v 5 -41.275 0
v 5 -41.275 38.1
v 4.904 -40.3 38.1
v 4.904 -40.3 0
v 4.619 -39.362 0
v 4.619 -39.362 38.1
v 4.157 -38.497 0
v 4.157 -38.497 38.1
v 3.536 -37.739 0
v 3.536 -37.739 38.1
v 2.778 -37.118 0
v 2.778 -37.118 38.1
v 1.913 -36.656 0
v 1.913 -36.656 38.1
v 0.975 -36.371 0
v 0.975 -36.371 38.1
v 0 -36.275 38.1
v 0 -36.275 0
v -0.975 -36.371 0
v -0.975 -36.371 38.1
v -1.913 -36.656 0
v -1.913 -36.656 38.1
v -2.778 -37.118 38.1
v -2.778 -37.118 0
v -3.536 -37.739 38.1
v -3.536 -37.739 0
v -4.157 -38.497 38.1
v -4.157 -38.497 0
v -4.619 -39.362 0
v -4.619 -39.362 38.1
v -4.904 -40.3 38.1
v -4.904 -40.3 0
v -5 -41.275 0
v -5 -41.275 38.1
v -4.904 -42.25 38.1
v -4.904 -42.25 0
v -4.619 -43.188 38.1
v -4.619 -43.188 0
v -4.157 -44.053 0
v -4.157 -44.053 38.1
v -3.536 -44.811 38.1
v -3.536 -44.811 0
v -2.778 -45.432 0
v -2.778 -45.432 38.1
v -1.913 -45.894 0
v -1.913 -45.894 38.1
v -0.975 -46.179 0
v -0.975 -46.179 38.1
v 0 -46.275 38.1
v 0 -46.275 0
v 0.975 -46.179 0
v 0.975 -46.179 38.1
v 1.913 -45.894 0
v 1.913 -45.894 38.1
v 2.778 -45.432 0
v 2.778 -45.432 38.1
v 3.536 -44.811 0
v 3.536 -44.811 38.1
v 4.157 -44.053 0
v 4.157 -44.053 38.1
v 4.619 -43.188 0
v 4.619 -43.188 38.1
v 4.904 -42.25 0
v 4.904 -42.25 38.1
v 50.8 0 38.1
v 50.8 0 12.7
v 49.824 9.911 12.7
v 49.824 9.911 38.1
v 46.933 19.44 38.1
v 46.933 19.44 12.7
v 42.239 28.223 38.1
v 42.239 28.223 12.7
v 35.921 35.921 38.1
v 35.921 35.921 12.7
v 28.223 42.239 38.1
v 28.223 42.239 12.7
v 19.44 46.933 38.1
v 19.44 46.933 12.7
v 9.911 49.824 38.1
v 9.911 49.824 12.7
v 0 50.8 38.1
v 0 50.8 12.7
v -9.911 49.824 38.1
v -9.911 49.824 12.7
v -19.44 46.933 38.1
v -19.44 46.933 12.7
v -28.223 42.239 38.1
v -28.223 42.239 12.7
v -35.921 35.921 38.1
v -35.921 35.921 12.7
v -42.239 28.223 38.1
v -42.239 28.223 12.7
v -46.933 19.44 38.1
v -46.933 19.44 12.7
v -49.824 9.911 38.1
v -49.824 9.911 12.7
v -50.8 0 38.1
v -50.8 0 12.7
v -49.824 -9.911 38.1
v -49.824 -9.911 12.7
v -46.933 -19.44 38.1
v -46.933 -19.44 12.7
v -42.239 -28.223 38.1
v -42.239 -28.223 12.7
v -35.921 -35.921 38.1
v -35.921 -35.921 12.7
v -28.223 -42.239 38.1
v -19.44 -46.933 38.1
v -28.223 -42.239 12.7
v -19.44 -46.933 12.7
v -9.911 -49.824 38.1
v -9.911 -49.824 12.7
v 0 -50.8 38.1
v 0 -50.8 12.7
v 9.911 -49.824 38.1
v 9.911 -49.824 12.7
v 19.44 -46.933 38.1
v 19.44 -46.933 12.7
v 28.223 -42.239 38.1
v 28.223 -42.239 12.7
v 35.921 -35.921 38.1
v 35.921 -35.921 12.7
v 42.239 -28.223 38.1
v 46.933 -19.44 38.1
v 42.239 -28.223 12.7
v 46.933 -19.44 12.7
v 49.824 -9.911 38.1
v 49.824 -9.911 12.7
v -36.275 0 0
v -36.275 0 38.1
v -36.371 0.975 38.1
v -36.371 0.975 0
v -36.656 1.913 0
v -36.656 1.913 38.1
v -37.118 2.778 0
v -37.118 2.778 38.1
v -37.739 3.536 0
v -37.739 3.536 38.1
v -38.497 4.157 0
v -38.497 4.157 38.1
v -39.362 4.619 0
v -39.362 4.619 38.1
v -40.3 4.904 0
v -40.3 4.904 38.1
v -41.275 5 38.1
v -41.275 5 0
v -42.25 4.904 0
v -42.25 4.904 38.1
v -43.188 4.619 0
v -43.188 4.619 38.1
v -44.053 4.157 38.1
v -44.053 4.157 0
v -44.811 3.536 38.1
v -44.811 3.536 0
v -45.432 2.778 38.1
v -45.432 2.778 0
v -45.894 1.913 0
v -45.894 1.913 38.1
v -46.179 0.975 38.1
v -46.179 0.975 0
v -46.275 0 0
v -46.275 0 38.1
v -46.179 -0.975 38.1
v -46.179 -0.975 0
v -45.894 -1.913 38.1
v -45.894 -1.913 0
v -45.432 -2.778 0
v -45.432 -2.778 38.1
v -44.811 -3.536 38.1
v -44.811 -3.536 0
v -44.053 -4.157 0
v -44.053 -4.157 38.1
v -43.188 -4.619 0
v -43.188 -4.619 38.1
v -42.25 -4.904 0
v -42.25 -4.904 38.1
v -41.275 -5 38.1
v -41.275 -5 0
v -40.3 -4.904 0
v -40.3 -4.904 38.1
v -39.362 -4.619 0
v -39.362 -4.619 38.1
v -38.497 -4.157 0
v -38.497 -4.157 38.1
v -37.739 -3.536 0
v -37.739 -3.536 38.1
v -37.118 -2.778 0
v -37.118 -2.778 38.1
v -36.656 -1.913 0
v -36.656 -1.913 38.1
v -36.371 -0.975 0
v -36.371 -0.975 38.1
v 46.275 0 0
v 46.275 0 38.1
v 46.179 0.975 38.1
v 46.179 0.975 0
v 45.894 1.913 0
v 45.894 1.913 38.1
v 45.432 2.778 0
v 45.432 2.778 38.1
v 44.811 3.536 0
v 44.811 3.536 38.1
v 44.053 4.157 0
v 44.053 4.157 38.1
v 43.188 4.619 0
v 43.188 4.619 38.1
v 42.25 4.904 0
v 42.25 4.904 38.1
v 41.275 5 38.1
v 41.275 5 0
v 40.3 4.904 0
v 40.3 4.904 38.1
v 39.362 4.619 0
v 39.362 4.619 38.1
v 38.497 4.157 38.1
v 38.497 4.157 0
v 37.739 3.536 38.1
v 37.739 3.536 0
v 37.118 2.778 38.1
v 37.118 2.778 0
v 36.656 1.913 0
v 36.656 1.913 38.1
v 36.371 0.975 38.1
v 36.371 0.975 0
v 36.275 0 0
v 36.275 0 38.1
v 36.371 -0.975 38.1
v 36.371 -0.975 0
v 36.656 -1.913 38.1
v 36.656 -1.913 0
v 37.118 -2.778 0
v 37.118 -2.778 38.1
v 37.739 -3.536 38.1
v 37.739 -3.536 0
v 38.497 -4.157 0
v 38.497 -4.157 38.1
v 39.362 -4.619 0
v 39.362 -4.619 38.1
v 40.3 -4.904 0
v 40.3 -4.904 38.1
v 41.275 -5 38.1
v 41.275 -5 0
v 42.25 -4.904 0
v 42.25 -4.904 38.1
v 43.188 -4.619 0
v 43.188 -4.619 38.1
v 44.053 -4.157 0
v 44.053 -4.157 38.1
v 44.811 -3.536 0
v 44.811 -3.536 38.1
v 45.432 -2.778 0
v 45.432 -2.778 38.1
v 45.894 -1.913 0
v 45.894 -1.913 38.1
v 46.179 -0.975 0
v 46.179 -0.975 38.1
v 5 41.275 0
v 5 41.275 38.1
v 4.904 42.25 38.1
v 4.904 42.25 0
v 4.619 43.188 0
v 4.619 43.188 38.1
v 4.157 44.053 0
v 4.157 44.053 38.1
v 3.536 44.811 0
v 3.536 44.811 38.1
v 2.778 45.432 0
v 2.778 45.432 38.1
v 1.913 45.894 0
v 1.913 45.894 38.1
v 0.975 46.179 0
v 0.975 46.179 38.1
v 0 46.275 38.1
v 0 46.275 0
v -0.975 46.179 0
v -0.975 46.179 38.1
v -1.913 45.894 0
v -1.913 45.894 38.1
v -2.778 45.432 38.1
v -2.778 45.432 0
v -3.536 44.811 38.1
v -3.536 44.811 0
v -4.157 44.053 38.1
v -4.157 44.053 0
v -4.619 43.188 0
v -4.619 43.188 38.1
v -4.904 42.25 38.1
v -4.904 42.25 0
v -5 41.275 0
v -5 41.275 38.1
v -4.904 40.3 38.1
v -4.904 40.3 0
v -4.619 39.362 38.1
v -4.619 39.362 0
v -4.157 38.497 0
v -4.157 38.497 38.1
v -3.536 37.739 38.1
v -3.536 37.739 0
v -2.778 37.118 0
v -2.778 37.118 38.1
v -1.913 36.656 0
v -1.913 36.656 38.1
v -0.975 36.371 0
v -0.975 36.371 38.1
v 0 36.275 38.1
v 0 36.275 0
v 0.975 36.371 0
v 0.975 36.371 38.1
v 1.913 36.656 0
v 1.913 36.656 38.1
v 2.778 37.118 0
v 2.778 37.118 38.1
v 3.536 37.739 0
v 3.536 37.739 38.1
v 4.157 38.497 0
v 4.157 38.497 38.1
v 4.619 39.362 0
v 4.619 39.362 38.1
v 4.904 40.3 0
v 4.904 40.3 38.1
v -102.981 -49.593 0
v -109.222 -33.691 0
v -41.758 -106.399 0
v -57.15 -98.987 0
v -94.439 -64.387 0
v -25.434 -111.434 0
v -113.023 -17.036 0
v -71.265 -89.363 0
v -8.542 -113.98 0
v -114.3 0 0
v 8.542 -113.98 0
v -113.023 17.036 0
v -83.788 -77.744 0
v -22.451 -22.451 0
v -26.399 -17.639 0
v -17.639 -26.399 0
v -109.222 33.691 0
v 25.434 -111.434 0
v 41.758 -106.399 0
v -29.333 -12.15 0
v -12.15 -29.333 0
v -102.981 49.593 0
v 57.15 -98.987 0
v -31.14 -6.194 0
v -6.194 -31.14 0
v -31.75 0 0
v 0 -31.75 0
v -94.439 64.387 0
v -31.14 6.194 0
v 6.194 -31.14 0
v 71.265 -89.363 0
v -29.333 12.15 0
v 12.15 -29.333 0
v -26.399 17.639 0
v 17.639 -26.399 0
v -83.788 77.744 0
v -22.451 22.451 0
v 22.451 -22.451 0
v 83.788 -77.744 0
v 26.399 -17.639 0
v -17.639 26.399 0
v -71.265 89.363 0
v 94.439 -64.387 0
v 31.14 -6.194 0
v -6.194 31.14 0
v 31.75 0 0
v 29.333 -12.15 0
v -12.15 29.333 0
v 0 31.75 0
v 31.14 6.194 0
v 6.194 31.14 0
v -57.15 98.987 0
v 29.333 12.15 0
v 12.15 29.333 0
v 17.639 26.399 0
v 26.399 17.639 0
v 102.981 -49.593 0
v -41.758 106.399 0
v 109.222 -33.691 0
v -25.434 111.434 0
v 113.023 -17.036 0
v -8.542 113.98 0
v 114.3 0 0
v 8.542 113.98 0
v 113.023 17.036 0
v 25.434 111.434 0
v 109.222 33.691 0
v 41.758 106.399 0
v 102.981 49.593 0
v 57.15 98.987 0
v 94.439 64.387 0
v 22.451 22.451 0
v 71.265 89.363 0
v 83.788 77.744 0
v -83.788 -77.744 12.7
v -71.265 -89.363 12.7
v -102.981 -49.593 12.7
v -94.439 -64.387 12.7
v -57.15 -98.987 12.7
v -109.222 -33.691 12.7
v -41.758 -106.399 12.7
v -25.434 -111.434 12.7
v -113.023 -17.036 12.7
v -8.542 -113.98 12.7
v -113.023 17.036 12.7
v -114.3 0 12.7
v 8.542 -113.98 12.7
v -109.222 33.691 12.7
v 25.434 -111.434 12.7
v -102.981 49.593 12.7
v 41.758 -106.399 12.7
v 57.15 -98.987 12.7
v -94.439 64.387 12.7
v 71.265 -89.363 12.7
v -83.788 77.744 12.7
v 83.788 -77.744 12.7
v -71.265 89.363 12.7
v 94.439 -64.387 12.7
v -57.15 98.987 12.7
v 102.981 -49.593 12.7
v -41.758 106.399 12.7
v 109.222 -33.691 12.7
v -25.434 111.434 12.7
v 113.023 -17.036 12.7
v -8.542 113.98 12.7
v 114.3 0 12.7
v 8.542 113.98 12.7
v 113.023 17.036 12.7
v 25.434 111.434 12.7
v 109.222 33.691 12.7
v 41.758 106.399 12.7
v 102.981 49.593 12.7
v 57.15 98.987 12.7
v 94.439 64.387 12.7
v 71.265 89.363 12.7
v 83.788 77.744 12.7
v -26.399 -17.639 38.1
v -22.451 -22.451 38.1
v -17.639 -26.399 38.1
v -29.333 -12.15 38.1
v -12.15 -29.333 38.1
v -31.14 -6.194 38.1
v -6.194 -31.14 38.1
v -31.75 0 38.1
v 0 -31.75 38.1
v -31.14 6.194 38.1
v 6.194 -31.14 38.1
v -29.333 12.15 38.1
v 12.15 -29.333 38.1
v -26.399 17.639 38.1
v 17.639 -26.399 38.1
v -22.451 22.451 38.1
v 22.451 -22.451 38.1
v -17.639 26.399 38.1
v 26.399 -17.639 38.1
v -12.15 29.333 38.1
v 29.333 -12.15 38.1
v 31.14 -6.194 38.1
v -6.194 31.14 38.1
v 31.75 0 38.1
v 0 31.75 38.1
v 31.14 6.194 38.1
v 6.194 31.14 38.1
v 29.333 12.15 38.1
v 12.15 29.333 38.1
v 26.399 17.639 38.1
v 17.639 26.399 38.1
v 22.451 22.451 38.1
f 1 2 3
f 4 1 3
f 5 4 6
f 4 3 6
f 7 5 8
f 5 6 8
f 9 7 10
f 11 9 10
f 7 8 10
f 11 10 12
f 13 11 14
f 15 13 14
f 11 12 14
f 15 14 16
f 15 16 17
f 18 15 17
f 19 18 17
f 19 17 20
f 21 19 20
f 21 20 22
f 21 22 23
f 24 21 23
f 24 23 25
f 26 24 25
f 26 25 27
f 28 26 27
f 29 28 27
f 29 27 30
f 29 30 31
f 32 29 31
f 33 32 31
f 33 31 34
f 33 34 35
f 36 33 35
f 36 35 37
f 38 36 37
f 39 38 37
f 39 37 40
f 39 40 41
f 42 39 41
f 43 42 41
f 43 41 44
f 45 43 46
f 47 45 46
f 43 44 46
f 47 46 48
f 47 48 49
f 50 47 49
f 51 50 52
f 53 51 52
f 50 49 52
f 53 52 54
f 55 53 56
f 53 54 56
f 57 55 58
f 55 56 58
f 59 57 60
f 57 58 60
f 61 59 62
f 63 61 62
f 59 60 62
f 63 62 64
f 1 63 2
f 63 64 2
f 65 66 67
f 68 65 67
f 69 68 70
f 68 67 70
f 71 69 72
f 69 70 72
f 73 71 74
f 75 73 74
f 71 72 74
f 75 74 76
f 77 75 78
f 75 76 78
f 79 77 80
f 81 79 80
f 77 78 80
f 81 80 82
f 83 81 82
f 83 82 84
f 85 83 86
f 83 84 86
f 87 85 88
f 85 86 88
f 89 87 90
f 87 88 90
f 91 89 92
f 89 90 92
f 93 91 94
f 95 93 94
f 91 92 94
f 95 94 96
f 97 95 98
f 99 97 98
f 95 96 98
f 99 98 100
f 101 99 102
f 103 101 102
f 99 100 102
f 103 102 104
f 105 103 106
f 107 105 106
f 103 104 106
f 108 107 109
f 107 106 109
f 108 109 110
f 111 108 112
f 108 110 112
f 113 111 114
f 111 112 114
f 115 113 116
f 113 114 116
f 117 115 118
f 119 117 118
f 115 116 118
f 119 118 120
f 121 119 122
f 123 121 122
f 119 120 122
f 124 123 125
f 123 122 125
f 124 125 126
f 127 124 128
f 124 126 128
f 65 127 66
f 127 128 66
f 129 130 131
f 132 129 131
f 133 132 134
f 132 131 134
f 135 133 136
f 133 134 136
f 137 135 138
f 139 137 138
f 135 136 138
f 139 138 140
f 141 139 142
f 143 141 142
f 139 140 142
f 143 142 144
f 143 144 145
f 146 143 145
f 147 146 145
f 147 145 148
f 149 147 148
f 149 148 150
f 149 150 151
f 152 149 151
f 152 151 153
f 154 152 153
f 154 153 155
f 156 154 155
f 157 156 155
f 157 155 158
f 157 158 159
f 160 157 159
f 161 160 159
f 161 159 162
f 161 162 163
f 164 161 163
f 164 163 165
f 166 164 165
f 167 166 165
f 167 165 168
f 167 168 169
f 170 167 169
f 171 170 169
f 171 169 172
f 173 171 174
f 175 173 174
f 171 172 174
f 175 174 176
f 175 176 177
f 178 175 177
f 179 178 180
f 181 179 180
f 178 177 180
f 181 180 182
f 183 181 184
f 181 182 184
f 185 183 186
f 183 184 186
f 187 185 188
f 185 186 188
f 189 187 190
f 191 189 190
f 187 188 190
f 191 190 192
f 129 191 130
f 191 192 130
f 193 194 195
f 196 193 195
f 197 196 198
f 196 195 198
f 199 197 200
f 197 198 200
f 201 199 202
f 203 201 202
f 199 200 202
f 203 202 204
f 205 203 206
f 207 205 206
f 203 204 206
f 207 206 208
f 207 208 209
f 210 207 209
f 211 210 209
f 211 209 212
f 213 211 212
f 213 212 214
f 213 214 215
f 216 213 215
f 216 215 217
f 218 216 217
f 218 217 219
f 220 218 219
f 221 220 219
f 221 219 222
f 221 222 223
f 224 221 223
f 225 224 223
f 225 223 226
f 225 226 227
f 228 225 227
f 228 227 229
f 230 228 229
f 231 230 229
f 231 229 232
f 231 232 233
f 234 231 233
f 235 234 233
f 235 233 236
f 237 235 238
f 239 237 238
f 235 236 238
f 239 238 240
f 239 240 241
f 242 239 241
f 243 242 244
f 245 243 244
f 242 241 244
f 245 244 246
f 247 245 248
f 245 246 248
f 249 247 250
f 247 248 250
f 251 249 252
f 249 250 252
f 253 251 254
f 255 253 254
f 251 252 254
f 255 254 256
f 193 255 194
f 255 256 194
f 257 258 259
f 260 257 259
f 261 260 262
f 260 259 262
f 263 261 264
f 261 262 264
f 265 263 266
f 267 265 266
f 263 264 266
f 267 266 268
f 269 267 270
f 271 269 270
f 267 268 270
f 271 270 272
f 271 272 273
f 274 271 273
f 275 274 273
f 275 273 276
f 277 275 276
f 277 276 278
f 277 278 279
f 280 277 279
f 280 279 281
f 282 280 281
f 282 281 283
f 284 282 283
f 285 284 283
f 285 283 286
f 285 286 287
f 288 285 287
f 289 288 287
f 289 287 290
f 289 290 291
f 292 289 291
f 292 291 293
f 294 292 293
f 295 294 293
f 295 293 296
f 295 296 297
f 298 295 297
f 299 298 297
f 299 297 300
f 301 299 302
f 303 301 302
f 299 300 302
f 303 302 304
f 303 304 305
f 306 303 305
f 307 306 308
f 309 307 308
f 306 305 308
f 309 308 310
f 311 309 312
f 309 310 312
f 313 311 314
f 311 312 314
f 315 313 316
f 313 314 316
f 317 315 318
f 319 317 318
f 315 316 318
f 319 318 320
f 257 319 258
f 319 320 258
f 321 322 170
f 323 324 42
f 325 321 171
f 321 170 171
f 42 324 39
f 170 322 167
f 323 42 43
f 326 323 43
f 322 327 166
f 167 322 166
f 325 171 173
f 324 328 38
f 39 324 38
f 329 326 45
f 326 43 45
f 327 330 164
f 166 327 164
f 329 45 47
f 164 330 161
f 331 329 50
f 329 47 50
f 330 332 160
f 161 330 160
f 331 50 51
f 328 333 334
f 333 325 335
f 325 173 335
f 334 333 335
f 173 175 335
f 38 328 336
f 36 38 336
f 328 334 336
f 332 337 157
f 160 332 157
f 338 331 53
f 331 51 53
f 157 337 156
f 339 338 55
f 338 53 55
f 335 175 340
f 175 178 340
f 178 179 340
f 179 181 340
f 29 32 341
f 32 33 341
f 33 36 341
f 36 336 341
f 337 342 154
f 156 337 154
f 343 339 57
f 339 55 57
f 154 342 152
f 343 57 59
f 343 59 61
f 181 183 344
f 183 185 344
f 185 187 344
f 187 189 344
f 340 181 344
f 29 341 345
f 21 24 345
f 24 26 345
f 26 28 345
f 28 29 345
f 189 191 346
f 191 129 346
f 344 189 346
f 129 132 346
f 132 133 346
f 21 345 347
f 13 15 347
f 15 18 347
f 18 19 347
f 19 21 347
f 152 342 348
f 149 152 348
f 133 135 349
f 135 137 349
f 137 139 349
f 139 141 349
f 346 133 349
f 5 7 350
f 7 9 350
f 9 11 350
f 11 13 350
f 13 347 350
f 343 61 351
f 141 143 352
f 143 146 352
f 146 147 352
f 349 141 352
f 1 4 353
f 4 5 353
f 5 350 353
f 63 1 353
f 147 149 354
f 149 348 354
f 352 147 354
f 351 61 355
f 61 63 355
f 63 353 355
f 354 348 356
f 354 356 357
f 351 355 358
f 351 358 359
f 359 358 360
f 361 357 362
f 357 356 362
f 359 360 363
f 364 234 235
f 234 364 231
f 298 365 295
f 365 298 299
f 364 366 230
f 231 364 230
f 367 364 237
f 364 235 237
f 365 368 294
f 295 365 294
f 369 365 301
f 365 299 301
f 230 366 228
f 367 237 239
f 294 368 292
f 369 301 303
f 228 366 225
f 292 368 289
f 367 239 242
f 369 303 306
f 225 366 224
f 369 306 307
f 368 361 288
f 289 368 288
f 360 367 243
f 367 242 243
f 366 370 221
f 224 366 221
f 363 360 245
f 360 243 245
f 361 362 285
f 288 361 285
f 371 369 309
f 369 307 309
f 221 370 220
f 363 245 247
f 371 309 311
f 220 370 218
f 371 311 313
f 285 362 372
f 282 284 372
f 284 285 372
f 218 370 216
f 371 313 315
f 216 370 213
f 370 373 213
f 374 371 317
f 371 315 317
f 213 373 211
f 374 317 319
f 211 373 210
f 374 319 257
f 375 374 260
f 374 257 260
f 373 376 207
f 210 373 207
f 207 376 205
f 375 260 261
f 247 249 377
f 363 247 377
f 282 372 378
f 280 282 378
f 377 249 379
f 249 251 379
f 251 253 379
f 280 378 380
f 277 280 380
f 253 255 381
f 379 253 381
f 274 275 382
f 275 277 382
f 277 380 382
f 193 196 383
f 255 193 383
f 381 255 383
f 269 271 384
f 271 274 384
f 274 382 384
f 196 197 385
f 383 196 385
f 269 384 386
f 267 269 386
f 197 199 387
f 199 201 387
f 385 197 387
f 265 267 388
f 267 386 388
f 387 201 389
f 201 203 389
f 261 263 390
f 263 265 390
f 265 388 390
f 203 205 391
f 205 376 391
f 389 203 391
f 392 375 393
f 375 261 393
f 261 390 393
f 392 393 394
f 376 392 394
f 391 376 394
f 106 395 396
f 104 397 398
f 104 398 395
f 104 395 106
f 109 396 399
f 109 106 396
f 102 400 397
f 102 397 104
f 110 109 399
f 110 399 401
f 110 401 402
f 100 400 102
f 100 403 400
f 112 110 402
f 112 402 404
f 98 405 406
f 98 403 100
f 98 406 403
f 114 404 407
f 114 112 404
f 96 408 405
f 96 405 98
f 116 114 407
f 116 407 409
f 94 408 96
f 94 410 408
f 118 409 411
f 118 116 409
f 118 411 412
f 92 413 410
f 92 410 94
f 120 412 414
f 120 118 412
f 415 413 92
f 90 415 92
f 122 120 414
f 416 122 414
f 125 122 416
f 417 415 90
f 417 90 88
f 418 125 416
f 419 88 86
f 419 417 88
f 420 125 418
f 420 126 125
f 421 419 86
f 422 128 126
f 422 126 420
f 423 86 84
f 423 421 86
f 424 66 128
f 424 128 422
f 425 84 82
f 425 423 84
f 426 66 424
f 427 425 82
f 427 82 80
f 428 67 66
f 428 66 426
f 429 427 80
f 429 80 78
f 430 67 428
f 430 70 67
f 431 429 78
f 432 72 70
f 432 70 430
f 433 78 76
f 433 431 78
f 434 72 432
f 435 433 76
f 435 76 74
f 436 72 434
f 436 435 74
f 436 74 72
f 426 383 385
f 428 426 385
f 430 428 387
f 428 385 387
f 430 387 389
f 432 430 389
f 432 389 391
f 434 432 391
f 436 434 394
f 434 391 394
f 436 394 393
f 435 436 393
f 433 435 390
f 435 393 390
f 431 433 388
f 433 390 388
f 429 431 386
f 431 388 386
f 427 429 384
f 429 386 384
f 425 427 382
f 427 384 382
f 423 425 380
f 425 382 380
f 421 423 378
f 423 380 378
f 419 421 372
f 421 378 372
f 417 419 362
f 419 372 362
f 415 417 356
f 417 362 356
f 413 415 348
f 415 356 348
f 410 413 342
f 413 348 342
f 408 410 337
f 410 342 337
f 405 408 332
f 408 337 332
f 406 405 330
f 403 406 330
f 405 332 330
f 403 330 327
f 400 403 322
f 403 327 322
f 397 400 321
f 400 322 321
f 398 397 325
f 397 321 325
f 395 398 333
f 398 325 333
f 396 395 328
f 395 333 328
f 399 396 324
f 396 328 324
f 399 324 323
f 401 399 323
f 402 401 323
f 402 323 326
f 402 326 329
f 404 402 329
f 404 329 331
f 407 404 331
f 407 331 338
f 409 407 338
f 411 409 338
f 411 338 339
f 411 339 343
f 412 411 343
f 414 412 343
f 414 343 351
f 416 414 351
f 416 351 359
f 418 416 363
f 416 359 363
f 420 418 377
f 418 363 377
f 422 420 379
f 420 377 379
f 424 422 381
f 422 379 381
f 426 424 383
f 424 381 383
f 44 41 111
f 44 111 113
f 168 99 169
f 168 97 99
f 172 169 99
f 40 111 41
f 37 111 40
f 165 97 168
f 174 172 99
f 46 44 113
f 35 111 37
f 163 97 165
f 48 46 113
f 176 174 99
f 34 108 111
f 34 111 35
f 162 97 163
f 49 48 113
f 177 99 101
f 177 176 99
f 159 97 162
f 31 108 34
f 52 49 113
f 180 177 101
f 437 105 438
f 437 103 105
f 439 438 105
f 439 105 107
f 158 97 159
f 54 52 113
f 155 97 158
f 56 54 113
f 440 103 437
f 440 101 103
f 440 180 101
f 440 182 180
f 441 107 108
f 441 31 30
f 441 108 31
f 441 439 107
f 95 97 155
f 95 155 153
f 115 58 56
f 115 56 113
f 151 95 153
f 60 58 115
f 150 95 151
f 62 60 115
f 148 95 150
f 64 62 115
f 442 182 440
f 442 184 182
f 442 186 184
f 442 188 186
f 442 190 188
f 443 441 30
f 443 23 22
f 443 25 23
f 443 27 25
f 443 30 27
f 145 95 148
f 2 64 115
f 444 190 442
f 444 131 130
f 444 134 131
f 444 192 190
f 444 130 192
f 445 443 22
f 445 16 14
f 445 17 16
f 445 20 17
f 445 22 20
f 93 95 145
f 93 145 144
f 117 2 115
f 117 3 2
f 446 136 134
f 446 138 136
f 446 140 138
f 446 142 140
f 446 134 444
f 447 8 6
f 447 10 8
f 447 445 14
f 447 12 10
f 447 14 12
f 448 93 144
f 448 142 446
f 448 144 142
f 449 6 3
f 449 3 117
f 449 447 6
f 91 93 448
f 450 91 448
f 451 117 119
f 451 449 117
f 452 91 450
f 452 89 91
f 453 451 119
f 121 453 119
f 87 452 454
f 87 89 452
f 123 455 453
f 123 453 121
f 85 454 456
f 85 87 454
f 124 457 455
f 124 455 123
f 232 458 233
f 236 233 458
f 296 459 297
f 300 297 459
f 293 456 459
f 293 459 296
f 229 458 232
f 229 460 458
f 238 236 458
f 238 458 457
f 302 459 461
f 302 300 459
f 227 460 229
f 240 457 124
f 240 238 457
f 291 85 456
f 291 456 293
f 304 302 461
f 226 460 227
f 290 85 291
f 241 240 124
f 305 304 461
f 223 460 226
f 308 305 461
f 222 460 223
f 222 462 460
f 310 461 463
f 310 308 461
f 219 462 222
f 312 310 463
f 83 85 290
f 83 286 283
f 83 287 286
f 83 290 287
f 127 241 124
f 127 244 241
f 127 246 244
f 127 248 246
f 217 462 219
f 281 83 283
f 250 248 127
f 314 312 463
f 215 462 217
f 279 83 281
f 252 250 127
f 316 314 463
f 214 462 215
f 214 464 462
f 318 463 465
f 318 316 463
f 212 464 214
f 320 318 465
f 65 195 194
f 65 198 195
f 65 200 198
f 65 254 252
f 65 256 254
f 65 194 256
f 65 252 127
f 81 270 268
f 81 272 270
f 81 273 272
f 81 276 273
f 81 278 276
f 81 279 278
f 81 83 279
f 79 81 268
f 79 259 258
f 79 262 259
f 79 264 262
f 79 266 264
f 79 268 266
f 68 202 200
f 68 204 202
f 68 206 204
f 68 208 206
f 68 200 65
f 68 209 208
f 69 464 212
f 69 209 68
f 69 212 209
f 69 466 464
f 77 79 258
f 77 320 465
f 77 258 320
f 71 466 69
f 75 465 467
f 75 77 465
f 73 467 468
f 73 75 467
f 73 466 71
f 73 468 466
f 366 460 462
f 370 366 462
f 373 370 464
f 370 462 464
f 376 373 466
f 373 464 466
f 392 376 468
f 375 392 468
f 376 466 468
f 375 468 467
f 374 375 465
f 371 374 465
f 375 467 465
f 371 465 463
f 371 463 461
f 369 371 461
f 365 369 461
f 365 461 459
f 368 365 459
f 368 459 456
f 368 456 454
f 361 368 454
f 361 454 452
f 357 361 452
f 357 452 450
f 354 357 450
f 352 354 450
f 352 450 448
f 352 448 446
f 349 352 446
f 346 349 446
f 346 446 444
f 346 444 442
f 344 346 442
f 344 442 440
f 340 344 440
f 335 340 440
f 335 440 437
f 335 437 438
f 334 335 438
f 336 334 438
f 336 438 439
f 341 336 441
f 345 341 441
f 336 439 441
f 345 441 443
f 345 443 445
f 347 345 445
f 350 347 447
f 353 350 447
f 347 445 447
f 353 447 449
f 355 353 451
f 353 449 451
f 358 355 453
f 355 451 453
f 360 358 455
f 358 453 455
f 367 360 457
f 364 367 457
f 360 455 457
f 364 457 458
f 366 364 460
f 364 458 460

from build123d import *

# Parameters (mm, degrees)
SKETCH1_R           = 114.3
BOSS_EXTRUDE1_DEPTH = 12.7
SKETCH2_R           = 50.8
BOSS_EXTRUDE2_DEPTH = 25.4
SKETCH3_R           = 31.75
CUT_EXTRUDE1_DEPTH  = 118.11
SKETCH4_R           = 5
CUT_EXTRUDE2_DEPTH  = 118.11


with BuildPart() as part:
    # Sketch1 → Boss-Extrude1 (new body)
    with BuildSketch(Plane.XY):
        Circle(SKETCH1_R)
    extrude(amount=BOSS_EXTRUDE1_DEPTH)

    # Sketch2 → Boss-Extrude2 (add)
    with BuildSketch(Plane.XY.offset(12.7)):
        Circle(SKETCH2_R)
    extrude(amount=BOSS_EXTRUDE2_DEPTH)

    # Sketch3 → Cut-Extrude1 (cut)
    with BuildSketch(Plane.XY.offset(38.1)):
        Circle(SKETCH3_R)
    extrude(amount=-CUT_EXTRUDE1_DEPTH, mode=Mode.SUBTRACT)

    # Sketch4 → Cut-Extrude2 (cut)
    with BuildSketch(Plane.XY.offset(38.1)):
        with Locations((0, 41.275)):
            Circle(SKETCH4_R)
        with Locations((41.275, 0)):
            Circle(SKETCH4_R)
        with Locations((0, -41.275)):
            Circle(SKETCH4_R)
        with Locations((-41.275, 0)):
            Circle(SKETCH4_R)
    extrude(amount=-CUT_EXTRUDE2_DEPTH, mode=Mode.SUBTRACT)


solid = part.part
